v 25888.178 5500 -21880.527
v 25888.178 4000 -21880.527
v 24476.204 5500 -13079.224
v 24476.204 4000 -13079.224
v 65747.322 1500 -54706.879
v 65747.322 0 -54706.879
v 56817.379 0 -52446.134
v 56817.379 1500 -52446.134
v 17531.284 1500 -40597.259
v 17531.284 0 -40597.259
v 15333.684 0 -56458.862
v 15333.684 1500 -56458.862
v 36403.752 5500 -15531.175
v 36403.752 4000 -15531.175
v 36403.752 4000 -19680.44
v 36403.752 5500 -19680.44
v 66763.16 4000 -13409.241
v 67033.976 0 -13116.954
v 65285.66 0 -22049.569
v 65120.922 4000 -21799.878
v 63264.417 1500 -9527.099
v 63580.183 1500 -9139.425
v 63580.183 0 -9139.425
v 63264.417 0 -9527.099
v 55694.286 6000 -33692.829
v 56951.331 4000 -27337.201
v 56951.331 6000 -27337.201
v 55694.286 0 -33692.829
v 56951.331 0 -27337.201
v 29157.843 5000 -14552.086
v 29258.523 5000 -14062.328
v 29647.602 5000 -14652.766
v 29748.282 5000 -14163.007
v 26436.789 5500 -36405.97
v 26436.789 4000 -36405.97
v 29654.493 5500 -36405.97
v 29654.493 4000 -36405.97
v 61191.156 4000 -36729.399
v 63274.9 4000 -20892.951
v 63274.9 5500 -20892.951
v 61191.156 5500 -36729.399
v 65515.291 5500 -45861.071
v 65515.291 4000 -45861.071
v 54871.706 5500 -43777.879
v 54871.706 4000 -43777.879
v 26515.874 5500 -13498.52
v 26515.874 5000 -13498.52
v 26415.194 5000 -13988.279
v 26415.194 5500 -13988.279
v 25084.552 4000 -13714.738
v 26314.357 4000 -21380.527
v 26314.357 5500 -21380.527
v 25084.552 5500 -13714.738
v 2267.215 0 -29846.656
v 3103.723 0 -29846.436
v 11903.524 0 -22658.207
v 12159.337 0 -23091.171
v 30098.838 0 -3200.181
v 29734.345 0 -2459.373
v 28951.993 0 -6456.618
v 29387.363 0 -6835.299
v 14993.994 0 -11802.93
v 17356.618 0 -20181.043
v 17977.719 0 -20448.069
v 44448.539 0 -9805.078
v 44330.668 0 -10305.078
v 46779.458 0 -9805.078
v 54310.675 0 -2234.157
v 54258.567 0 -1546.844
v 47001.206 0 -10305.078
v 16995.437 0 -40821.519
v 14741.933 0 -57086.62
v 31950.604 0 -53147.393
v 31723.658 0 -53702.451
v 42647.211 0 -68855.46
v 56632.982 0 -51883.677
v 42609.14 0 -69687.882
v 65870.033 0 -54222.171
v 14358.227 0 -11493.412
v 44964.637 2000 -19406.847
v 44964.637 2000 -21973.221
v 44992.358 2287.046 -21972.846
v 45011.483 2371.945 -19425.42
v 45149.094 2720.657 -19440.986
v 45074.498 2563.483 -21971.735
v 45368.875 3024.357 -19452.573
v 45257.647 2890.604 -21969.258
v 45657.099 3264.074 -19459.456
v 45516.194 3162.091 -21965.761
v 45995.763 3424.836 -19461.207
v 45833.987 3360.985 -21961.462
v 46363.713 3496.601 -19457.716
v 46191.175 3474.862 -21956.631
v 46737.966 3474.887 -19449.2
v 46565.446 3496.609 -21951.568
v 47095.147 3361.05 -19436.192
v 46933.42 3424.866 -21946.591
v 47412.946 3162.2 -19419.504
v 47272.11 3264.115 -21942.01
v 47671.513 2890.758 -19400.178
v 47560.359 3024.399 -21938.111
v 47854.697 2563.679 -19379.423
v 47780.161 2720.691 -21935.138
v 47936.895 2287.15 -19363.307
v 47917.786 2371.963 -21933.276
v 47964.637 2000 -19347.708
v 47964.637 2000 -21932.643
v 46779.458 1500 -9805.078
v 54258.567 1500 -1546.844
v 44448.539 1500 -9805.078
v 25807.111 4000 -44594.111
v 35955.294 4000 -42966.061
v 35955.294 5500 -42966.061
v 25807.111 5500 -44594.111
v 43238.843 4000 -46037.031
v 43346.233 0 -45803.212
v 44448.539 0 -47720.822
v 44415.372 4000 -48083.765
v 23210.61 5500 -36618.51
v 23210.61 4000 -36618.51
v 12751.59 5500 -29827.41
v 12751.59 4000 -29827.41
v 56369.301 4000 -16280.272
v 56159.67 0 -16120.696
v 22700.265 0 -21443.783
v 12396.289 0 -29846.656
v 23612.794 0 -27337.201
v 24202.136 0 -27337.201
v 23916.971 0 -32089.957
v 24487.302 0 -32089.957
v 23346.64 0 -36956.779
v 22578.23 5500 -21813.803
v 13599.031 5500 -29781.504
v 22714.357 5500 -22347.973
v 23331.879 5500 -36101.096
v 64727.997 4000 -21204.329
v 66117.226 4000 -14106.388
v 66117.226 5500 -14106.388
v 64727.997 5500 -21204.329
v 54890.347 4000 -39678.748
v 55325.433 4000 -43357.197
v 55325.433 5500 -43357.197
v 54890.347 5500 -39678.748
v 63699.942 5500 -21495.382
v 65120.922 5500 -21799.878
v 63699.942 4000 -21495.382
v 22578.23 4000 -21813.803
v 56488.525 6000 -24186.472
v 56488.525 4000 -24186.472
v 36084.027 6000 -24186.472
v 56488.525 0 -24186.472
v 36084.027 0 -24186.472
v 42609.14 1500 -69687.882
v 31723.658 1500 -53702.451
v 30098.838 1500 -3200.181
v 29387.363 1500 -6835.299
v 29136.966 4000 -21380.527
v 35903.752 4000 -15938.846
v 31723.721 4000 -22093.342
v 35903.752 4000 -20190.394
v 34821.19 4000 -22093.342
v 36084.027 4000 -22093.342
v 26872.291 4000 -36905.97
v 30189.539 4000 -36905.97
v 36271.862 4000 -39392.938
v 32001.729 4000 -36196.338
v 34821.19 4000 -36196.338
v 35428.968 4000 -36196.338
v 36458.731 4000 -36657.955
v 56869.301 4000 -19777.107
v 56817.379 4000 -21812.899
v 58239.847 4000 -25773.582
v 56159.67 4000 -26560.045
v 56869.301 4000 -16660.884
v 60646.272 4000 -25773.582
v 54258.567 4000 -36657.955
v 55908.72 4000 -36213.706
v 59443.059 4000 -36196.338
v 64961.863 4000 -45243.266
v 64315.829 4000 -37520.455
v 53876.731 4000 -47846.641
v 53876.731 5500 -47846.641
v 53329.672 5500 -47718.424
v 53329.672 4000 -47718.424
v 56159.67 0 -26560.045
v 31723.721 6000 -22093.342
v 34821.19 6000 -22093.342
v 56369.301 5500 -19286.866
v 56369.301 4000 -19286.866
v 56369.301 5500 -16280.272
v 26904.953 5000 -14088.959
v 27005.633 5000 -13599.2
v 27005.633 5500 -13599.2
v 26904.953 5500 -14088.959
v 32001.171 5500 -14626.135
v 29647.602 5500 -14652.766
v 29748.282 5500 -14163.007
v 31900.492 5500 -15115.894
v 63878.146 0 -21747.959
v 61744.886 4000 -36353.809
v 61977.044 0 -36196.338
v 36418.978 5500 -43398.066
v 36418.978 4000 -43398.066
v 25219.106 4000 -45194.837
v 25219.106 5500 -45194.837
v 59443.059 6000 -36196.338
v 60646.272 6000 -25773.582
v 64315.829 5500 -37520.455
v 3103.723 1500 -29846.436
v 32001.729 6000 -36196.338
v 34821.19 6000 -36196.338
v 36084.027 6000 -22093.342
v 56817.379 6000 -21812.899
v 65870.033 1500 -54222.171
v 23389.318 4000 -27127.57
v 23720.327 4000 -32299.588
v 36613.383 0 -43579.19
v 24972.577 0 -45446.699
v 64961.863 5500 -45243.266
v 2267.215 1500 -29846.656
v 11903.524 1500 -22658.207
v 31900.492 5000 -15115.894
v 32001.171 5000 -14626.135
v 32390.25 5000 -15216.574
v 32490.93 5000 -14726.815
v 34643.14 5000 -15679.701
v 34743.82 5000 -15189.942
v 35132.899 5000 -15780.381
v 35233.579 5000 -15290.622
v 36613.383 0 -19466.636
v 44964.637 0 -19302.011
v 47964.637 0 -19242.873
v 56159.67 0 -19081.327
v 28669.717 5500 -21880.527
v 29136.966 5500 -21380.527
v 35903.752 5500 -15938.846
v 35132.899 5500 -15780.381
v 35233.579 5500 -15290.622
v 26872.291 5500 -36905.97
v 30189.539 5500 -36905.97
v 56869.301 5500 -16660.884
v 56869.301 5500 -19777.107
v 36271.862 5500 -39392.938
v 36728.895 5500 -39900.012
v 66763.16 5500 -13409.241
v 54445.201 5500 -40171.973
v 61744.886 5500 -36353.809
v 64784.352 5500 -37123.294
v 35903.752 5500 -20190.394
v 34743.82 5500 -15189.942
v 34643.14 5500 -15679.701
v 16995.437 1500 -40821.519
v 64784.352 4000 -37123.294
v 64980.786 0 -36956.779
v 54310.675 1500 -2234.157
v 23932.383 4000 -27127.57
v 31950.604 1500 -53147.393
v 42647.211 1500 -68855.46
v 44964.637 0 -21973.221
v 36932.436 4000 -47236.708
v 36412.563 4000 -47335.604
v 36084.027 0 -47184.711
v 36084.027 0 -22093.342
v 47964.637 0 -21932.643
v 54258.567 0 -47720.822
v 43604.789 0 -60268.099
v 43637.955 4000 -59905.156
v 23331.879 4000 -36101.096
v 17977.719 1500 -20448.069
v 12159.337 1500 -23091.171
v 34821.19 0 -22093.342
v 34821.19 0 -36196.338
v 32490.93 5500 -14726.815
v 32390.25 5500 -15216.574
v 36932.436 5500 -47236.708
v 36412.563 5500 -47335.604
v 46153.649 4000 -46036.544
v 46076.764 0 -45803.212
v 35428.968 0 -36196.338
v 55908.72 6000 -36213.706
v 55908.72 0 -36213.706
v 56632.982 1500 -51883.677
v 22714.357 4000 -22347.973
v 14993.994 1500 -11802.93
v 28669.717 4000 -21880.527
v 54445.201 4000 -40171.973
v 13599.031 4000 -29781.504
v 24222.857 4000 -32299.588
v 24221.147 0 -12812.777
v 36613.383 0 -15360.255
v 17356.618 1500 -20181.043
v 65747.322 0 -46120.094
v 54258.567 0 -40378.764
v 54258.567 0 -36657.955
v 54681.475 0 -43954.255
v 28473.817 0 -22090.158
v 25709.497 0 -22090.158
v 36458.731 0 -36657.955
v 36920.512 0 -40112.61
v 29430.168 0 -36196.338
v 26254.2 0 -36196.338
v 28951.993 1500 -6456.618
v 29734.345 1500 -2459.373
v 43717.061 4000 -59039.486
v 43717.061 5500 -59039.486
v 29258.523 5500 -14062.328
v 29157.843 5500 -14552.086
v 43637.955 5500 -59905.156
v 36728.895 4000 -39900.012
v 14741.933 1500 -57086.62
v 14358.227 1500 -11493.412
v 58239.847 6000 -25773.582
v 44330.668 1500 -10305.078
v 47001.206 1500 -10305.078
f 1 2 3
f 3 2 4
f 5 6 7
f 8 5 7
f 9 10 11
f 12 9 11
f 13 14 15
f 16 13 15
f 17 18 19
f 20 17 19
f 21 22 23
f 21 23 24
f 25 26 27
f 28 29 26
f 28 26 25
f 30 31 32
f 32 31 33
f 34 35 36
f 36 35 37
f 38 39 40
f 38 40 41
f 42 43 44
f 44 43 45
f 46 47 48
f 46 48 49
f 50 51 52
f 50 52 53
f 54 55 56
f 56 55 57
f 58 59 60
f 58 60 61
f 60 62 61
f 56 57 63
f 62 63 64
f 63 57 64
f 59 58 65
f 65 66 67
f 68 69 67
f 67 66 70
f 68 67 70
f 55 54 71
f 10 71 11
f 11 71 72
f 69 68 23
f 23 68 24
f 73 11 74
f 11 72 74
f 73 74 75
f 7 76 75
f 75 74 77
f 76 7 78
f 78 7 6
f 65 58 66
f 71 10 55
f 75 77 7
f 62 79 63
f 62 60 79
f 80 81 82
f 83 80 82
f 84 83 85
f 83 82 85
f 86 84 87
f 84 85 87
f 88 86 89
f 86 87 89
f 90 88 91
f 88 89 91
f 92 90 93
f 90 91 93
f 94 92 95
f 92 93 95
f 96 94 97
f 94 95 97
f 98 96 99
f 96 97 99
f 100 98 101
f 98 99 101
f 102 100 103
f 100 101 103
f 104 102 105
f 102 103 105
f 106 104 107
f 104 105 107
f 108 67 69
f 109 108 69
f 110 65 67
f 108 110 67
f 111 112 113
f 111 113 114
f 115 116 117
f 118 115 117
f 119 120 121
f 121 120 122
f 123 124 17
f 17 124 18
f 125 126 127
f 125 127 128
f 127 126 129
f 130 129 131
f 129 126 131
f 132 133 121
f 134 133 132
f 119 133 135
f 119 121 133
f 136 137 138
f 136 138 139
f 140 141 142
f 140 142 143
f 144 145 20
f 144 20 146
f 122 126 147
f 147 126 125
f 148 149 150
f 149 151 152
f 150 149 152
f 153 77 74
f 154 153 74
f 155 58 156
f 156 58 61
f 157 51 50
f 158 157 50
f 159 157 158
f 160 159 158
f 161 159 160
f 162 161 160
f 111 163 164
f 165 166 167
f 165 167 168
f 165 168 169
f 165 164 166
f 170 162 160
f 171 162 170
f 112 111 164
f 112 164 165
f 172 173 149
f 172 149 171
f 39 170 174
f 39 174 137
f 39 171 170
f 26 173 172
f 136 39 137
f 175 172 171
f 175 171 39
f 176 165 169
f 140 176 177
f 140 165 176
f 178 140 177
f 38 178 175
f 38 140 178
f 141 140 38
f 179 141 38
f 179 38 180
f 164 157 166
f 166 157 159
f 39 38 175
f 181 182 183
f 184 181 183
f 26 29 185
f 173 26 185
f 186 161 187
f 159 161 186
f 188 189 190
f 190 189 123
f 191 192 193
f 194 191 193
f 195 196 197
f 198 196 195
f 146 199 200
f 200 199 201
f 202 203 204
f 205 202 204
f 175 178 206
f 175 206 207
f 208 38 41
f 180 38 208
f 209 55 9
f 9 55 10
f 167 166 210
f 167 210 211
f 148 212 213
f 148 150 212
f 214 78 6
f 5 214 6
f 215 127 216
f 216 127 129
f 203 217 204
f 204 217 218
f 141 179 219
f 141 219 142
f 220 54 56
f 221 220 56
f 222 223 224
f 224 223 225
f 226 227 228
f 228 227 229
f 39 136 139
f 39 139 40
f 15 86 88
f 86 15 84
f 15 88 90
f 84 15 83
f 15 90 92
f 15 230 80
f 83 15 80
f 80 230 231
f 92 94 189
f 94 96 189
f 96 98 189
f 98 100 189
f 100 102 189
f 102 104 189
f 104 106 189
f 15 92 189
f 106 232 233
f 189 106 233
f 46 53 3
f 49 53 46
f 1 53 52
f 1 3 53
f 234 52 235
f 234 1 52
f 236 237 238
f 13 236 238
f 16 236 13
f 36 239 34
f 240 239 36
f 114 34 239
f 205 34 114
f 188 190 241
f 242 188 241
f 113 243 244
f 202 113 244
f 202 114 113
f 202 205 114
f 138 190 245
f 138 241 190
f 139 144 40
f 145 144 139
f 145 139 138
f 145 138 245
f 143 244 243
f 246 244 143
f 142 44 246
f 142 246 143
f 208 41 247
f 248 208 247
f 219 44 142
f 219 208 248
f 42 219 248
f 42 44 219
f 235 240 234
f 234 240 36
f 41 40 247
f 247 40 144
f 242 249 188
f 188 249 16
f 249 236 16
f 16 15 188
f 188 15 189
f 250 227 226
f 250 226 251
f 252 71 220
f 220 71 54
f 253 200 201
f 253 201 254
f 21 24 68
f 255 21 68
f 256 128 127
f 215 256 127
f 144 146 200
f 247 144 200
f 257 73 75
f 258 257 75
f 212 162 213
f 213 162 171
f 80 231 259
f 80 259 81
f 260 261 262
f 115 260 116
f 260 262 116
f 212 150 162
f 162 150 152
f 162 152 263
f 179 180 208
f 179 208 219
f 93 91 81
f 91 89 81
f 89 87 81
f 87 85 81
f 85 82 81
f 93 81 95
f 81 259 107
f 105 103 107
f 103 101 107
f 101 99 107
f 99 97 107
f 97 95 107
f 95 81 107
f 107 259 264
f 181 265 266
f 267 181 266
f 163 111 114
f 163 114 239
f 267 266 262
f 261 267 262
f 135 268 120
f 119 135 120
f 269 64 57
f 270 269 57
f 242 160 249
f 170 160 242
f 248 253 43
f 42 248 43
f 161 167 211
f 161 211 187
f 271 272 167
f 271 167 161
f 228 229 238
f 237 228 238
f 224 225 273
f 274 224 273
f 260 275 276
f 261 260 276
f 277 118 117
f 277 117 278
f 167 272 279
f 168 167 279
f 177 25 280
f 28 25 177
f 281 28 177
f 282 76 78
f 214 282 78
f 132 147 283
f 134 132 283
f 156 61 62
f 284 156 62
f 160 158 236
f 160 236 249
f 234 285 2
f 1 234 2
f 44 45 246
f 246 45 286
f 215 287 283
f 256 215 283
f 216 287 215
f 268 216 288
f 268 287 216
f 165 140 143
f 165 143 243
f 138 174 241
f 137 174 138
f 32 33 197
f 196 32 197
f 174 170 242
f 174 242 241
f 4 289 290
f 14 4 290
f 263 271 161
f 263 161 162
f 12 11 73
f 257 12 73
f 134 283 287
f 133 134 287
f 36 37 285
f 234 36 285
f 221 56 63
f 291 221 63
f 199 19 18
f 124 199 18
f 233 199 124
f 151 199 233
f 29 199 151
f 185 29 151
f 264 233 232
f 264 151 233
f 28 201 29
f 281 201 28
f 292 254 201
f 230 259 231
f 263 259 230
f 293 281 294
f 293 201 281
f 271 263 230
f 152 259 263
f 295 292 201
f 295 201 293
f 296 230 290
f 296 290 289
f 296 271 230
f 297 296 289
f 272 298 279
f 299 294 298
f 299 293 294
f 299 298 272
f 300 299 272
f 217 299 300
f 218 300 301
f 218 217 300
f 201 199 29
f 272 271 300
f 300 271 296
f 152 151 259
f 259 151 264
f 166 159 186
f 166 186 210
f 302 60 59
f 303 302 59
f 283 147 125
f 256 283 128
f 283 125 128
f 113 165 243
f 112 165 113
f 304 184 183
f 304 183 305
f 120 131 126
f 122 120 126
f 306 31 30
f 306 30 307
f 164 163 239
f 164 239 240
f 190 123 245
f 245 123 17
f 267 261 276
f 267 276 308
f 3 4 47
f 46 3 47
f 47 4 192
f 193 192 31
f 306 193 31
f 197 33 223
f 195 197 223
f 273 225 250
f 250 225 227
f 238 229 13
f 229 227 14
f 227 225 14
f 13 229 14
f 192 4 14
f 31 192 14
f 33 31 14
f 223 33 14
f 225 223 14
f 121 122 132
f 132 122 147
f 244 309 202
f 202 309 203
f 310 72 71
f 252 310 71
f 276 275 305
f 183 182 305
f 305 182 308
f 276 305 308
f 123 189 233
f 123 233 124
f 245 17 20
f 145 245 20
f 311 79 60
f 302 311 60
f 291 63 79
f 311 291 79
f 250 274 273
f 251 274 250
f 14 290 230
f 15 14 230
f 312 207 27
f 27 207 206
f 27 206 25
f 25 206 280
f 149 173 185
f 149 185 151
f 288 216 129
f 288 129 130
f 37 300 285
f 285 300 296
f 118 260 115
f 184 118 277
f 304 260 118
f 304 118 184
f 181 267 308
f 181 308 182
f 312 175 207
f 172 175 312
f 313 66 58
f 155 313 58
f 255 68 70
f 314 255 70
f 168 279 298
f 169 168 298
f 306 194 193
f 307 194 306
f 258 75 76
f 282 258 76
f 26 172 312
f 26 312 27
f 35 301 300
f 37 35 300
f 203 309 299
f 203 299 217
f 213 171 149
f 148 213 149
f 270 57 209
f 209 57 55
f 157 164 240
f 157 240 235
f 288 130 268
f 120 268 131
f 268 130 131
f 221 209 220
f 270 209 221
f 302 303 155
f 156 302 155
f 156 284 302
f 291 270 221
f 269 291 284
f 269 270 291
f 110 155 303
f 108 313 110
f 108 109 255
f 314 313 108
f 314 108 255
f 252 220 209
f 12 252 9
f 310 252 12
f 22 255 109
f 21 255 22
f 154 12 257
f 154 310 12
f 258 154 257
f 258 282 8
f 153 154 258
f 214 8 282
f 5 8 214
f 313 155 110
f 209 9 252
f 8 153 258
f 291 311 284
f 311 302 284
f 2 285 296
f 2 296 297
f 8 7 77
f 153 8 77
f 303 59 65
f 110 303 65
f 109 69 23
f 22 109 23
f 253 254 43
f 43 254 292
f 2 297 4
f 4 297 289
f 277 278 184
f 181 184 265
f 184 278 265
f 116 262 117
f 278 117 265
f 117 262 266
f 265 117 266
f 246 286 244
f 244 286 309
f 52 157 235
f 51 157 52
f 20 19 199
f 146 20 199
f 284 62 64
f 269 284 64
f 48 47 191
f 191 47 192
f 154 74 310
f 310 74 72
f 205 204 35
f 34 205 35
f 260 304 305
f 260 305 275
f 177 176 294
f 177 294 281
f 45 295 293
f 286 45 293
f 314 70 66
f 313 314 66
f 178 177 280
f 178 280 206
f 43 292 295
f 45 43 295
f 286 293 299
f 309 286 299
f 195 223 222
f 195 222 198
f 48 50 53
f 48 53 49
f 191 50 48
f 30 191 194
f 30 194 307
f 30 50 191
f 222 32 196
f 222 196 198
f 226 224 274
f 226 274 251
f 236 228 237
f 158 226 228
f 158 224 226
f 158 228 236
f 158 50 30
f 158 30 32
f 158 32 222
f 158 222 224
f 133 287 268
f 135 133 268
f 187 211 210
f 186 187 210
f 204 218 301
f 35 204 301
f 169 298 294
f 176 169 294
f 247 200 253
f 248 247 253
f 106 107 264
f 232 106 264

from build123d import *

# Parameters (mm, degrees)
BOSS_EXTRUDE2_DEPTH           = 4000
BOSS_EXTRUDE2_DRAFT           = 3
BOSS_EXTRUDE2_PROFILE_2_DEPTH = 4000
BOSS_EXTRUDE2_PROFILE_2_DRAFT = 3
BOSS_EXTRUDE2_PROFILE_3_DEPTH = 4000
BOSS_EXTRUDE2_PROFILE_3_DRAFT = 3
CUT_EXTRUDE8_DEPTH            = 90232.910730358
CUT_EXTRUDE8_DEPTH_BACK       = 9000
BOSS_EXTRUDE8_DEPTH           = 1500
BOSS_EXTRUDE3_START           = 4000
BOSS_EXTRUDE3_DEPTH           = 1500
BOSS_EXTRUDE4_START           = 4000
BOSS_EXTRUDE4_DEPTH           = 1500
BOSS_EXTRUDE5_START           = 4000
BOSS_EXTRUDE5_DEPTH           = 1500
CUT_EXTRUDE9_DEPTH            = 11000
SKETCH12_W                    = 500
SKETCH12_H                    = 500
CUT_EXTRUDE10_DEPTH           = 500
LPATTERN1_COUNT               = 4
LPATTERN1_PITCH               = 2800
BOSS_EXTRUDE7_DEPTH           = 6000


with BuildPart() as part:
    # Sketch5 → Boss-Extrude2 (with draft: the straight prism first)
    with BuildSketch(Plane(origin=(0, 0, 0), x_dir=(1, 0, 0), z_dir=(0, 1, 0))):
        Polygon((24221.147231465, 12812.777238771), (36613.382745291, 15360.254637852), (36613.382745291, 19466.636116967), (56159.669846807, 19081.326574374), (56159.669846807, 16120.695652503), (67033.976356316, 13116.953644631), (65285.659888842, 22049.569248776), (63878.146145515, 21747.95916092), (61977.043608887, 36196.338439289), (64980.785616759, 36956.77945394), (65747.322139372, 46120.093680485), (54681.474863666, 43954.255153895), (54258.567310179, 40378.76401987), (36920.512176137, 40112.609664742), (36613.382745291, 43579.189822963), (24972.576970271, 45446.698770827), (26254.199807291, 36196.338439289), (29430.168181824, 36196.338439289), (28473.81693967, 22090.157617513), (25709.497024846, 22090.157617513), align=None)
    extrude(amount=BOSS_EXTRUDE2_DEPTH)
    # Boss-Extrude2: the draft: its side faces are tilted about the plane it starts from
    boss_extrude2_sides = [part.faces().sort_by_distance(p)[0] for p in [
        (30417.264988378, 2000, -14086.515938311),
        (36613.382745291, 2000, -17413.445377409),
        (46386.526296049, 2000, -19273.981345671),
        (56159.669846807, 2000, -17601.011113438),
        (61596.823101562, 2000, -14618.824648567),
        (66159.818122579, 2000, -17583.261446704),
        (64581.903017178, 2000, -21898.764204848),
        (62927.594877201, 2000, -28972.148800105),
        (63478.914612823, 2000, -36576.558946615),
        (65364.053878065, 2000, -41538.436567213),
        (60214.398501519, 2000, -45037.17441719),
        (54470.021086923, 2000, -42166.509586883),
        (45589.539743158, 2000, -40245.686842306),
        (36766.947460714, 2000, -41845.899743852),
        (30792.979857781, 2000, -44512.944296895),
        (25613.388388781, 2000, -40821.518605058),
        (27842.183994557, 2000, -36196.338439289),
        (28951.992560747, 2000, -29143.248028401),
        (27091.656982258, 2000, -22090.157617513),
        (24965.322128155, 2000, -17451.467428142),
    ]]
    draft(boss_extrude2_sides, Plane(origin=(0, 0, 0), x_dir=(1, 0, 0), z_dir=(0, 1, 0)), BOSS_EXTRUDE2_DRAFT)

    # Sketch5<4> → Cut-Extrude8 (cut, two sides)
    with BuildSketch(Plane(origin=(0, 0, 0), x_dir=(1, 0, 0), z_dir=(0, 1, 0))) as cut_extrude8_sk:
        Polygon((35428.968084809, 22093.341525096), (31723.721045337, 22093.341525096), (32001.728794941, 36196.338439289), (35428.968084809, 36196.338439289), align=None)
        Polygon((36084.02706002, 22093.341525096), (35428.968084809, 22093.341525096), (35428.968084809, 36196.338439289), (36458.730662276, 36657.954872095), (54258.567310179, 36657.954872095), (55973.233378537, 36196.338439289), (55973.233378537, 34396.808595444), (56951.330931415, 27337.200618605), (56159.669846807, 26560.044676759), (36084.02706002, 26560.044676759), align=None)
        Polygon((59443.059424266, 36196.338439289), (60646.271833248, 25773.58180428), (58239.847015285, 25773.58180428), (56951.330931415, 27337.200618605), (55973.233378537, 34396.808595444), (55973.233378537, 36196.338439289), align=None)
        Polygon((56817.379343917, 21812.899365358), (36084.02706002, 22093.341525096), (36084.02706002, 26560.044676759), (56159.669846807, 26560.044676759), align=None)
    extrude(amount=CUT_EXTRUDE8_DEPTH, mode=Mode.SUBTRACT)
    extrude(cut_extrude8_sk.sketch, amount=-CUT_EXTRUDE8_DEPTH_BACK, mode=Mode.SUBTRACT)

    # Sketch7<4> → Boss-Extrude4 (add)
    with BuildSketch(Plane(origin=(0, 0, 0), x_dir=(1, 0, 0), z_dir=(0, 1, 0)).offset(BOSS_EXTRUDE4_START)):
        Polygon((28669.716997515, 21880.526500381), (25888.177990487, 21880.526500381), (24476.204351751, 13079.224152258), (36403.751628159, 15531.175382463), (36403.751628159, 19680.440349773), (56369.300963939, 19286.866028357), (56369.300963939, 16280.272060367), (66763.160475319, 13409.240936594), (65120.921538659, 21799.878114852), (63699.941915328, 21495.382481281), (61744.885798014, 36353.808972866), (64784.351704009, 37123.294012359), (65515.290885637, 45861.071279535), (54871.705572801, 43777.879043348), (54445.20057926, 40171.97318886), (36728.895454385, 39900.012364574), (36418.977542885, 43398.066197205), (25219.105564891, 45194.837102765), (26436.789304251, 36405.969556421), (29654.492797924, 36405.969556421), align=None)
        Polygon((35955.293512896, 42966.060614647), (25807.111291314, 44594.11123843), (26872.291197907, 36905.969556421), (30189.538880703, 36905.969556421), (29136.966470124, 21380.526500381), (26314.3574816, 21380.526500381), (25084.551823671, 13714.737899291), (35903.751628159, 15938.845643799), (35903.751628159, 20190.393823596), (56869.300963939, 19777.106830377), (56869.300963939, 16660.884466691), (66117.226120005, 14106.387657847), (64727.997166463, 21204.329282836), (63274.899506011, 20892.951212739), (61191.156432714, 36729.3985698), (64315.828911598, 37520.454893568), (64961.863377094, 45243.266049822), (55325.432843202, 43357.196959123), (54890.347443984, 39678.747674825), (36271.86234696, 39392.937596582), align=None, mode=Mode.SUBTRACT)
    extrude(amount=BOSS_EXTRUDE4_DEPTH)

    # Sketch9 → Cut-Extrude9 (cut)
    with BuildSketch(Plane.XY.offset(-30000)):
        with BuildLine():
            Line((44964.636947484, 0), (44964.636947484, 2000))
            ThreePointArc((44964.636947484, 2000), (46464.636947484, 3500), (47964.636947484, 2000))
            Line((47964.636947484, 2000), (47964.636947484, 0))
            Line((47964.636947484, 0), (44964.636947484, 0))
        make_face()
    extrude(amount=CUT_EXTRUDE9_DEPTH, mode=Mode.SUBTRACT)

    # Sketch12 → Cut-Extrude10 (cut)
    with BuildSketch(Plane(origin=(-1587.279743094, 0, -7721.342065621), x_dir=(0.9795173421549181, 0, -0.2013598182800262), z_dir=(0.20135981828002616, 0, 0.979517342154918))):
        with Locations((37340.818301027, 5250)):
            Rectangle(SKETCH12_W, SKETCH12_H)
    cut_extrude10 = extrude(amount=-CUT_EXTRUDE10_DEPTH, mode=Mode.SUBTRACT)

    # LPattern1: Cut-Extrude10 ×4
    with Locations(*[Vector(-0.9795173421549181, 0, 0.2013598182800262) * (i * LPATTERN1_PITCH) for i in range(1, LPATTERN1_COUNT)]):
        add(cut_extrude10, mode=Mode.SUBTRACT)

    # Sketch8 → Boss-Extrude7 (add)
    with BuildSketch(Plane(origin=(0, 0, 0), x_dir=(1, 0, 0), z_dir=(0, 1, 0))):
        Polygon((32001.728794941, 36196.338439289), (34821.189503531, 36196.338439289), (34821.189503531, 22093.341525096), (31723.721045337, 22093.341525096), align=None)
        Polygon((36084.02706002, 22093.341525096), (56817.379343917, 21812.899365358), (56488.524595362, 24186.472021059), (36084.02706002, 24186.472021059), align=None)
        Polygon((59443.059424266, 36196.338439289), (60646.271833248, 25773.58180428), (58239.847015285, 25773.58180428), (56951.330931415, 27337.200618605), (55694.285613264, 33692.829318225), (55908.720433738, 36213.706389818), align=None)
    extrude(amount=BOSS_EXTRUDE7_DEPTH)


with BuildPart() as body_2:
    # Sketch5 → Boss-Extrude2 profile 2 (with draft: the straight prism first)
    with BuildSketch(Plane(origin=(0, 0, 0), x_dir=(1, 0, 0), z_dir=(0, 1, 0))):
        Polygon((22700.265202163, 21443.78275506), (24202.136206099, 27337.200618605), (23612.794419744, 27337.200618605), (23916.970825604, 32089.956960174), (24487.301586593, 32089.956960174), (23346.640064616, 36956.77945394), (12396.289453642, 29846.655966953), align=None)
    extrude(amount=BOSS_EXTRUDE2_PROFILE_2_DEPTH)
    # Boss-Extrude2 profile 2: the draft: its side faces are tilted about the plane it starts from
    boss_extrude2_profile_2_sides = [body_2.faces().sort_by_distance(p)[0] for p in [
        (23451.200704131, 2000, -24390.491686832),
        (23907.465312921, 2000, -27337.200618605),
        (23764.882622674, 2000, -29713.578789389),
        (24202.136206099, 2000, -32089.956960174),
        (23916.970825604, 2000, -34523.368207057),
        (17871.464759129, 2000, -33401.717710447),
        (17548.277327902, 2000, -25645.219361007),
    ]]
    draft(boss_extrude2_profile_2_sides, Plane(origin=(0, 0, 0), x_dir=(1, 0, 0), z_dir=(0, 1, 0)), BOSS_EXTRUDE2_PROFILE_2_DRAFT)

    # Sketch7<6> → Boss-Extrude5 (add)
    with BuildSketch(Plane(origin=(0, 0, 0), x_dir=(1, 0, 0), z_dir=(0, 1, 0)).offset(BOSS_EXTRUDE5_START)):
        Polygon((23210.610198856, 36618.509706606), (12751.589675404, 29827.409575058), (22578.229585565, 21813.802858654), (22714.35680761, 22347.972970475), (13599.031187481, 29781.504195747), (23331.878959981, 36101.096325807), align=None)
    extrude(amount=BOSS_EXTRUDE5_DEPTH)


with BuildPart() as body_3:
    # Sketch5 → Boss-Extrude2 profile 3 (with draft: the straight prism first)
    with BuildSketch(Plane(origin=(0, 0, 0), x_dir=(1, 0, 0), z_dir=(0, 1, 0))):
        Polygon((36084.02706002, 47184.711100996), (43346.233299116, 45803.211873316), (44448.538693732, 47720.822016325), (46076.764033341, 45803.211873316), (54258.567310179, 47720.822016325), (43604.788694919, 60268.098758067), align=None)
    extrude(amount=BOSS_EXTRUDE2_PROFILE_3_DEPTH)
    # Boss-Extrude2 profile 3: the draft: its side faces are tilted about the plane it starts from
    boss_extrude2_profile_3_sides = [body_3.faces().sort_by_distance(p)[0] for p in [
        (39715.130179568, 2000, -46493.961487156),
        (43897.385996424, 2000, -46762.016944821),
        (45262.651363537, 2000, -46762.016944821),
        (50167.66567176, 2000, -46762.016944821),
        (48931.678002549, 2000, -53994.460387196),
        (39844.40787747, 2000, -53726.404929532),
    ]]
    draft(boss_extrude2_profile_3_sides, Plane(origin=(0, 0, 0), x_dir=(1, 0, 0), z_dir=(0, 1, 0)), BOSS_EXTRUDE2_PROFILE_3_DRAFT)

    # Sketch7 → Boss-Extrude3 (add)
    with BuildSketch(Plane(origin=(0, 0, 0), x_dir=(1, 0, 0), z_dir=(0, 1, 0)).offset(BOSS_EXTRUDE3_START)):
        Polygon((36932.436046199, 47236.70759238), (36412.562863177, 47335.603764864), (43637.955042603, 59905.156085089), (53876.73067046, 47846.640891682), (53329.672426153, 47718.424115673), (43717.061494303, 59039.486240978), align=None)
    extrude(amount=BOSS_EXTRUDE3_DEPTH)


with BuildPart() as body_4:
    # Sketch5<6> → Boss-Extrude8 (new body)
    with BuildSketch(Plane(origin=(0, 0, 0), x_dir=(1, 0, 0), z_dir=(0, 1, 0))):
        Polygon((54258.567310179, 1546.843606716), (63580.182900737, 9139.424700384), (63264.41664934, 9527.099402265), (54310.67496669, 2234.156547366), (47001.206294489, 10305.078249172), (44330.668211136, 10305.078249172), (30098.838301686, 3200.181479544), (29387.362945299, 6835.299027577), (14993.993678286, 11802.92956724), (16054.681746074, 14876.200599556), (17977.718880796, 20448.068992994), (12159.337222509, 23091.171139248), (3103.722947215, 29846.436428417), (17531.283631937, 40597.258986746), (15333.683541619, 56458.862036314), (31950.603856265, 53147.392889184), (42647.210782744, 68855.459777976), (56632.98216886, 51883.676851905), (65870.033072857, 54222.170751651), (65747.322139372, 54706.878938918), (56817.379343917, 52446.13392741), (42609.140070311, 69687.882419931), (31723.658282012, 53702.45103757), (14741.932604944, 57086.619678919), (16995.436710251, 40821.518605058), (2267.21513849, 29846.655966953), (11903.523676148, 22658.207055457), (17356.617773435, 20181.043204968), (15582.039798208, 15039.325058534), (14358.227271441, 11493.412078351), (28951.992560747, 6456.61820508), (29734.344587685, 2459.372824298), (44448.538693732, 9805.078249172), (46779.457781313, 9805.078249172), align=None)
    extrude(amount=BOSS_EXTRUDE8_DEPTH)


solid = Compound([part.part, body_2.part, body_3.part, body_4.part])
